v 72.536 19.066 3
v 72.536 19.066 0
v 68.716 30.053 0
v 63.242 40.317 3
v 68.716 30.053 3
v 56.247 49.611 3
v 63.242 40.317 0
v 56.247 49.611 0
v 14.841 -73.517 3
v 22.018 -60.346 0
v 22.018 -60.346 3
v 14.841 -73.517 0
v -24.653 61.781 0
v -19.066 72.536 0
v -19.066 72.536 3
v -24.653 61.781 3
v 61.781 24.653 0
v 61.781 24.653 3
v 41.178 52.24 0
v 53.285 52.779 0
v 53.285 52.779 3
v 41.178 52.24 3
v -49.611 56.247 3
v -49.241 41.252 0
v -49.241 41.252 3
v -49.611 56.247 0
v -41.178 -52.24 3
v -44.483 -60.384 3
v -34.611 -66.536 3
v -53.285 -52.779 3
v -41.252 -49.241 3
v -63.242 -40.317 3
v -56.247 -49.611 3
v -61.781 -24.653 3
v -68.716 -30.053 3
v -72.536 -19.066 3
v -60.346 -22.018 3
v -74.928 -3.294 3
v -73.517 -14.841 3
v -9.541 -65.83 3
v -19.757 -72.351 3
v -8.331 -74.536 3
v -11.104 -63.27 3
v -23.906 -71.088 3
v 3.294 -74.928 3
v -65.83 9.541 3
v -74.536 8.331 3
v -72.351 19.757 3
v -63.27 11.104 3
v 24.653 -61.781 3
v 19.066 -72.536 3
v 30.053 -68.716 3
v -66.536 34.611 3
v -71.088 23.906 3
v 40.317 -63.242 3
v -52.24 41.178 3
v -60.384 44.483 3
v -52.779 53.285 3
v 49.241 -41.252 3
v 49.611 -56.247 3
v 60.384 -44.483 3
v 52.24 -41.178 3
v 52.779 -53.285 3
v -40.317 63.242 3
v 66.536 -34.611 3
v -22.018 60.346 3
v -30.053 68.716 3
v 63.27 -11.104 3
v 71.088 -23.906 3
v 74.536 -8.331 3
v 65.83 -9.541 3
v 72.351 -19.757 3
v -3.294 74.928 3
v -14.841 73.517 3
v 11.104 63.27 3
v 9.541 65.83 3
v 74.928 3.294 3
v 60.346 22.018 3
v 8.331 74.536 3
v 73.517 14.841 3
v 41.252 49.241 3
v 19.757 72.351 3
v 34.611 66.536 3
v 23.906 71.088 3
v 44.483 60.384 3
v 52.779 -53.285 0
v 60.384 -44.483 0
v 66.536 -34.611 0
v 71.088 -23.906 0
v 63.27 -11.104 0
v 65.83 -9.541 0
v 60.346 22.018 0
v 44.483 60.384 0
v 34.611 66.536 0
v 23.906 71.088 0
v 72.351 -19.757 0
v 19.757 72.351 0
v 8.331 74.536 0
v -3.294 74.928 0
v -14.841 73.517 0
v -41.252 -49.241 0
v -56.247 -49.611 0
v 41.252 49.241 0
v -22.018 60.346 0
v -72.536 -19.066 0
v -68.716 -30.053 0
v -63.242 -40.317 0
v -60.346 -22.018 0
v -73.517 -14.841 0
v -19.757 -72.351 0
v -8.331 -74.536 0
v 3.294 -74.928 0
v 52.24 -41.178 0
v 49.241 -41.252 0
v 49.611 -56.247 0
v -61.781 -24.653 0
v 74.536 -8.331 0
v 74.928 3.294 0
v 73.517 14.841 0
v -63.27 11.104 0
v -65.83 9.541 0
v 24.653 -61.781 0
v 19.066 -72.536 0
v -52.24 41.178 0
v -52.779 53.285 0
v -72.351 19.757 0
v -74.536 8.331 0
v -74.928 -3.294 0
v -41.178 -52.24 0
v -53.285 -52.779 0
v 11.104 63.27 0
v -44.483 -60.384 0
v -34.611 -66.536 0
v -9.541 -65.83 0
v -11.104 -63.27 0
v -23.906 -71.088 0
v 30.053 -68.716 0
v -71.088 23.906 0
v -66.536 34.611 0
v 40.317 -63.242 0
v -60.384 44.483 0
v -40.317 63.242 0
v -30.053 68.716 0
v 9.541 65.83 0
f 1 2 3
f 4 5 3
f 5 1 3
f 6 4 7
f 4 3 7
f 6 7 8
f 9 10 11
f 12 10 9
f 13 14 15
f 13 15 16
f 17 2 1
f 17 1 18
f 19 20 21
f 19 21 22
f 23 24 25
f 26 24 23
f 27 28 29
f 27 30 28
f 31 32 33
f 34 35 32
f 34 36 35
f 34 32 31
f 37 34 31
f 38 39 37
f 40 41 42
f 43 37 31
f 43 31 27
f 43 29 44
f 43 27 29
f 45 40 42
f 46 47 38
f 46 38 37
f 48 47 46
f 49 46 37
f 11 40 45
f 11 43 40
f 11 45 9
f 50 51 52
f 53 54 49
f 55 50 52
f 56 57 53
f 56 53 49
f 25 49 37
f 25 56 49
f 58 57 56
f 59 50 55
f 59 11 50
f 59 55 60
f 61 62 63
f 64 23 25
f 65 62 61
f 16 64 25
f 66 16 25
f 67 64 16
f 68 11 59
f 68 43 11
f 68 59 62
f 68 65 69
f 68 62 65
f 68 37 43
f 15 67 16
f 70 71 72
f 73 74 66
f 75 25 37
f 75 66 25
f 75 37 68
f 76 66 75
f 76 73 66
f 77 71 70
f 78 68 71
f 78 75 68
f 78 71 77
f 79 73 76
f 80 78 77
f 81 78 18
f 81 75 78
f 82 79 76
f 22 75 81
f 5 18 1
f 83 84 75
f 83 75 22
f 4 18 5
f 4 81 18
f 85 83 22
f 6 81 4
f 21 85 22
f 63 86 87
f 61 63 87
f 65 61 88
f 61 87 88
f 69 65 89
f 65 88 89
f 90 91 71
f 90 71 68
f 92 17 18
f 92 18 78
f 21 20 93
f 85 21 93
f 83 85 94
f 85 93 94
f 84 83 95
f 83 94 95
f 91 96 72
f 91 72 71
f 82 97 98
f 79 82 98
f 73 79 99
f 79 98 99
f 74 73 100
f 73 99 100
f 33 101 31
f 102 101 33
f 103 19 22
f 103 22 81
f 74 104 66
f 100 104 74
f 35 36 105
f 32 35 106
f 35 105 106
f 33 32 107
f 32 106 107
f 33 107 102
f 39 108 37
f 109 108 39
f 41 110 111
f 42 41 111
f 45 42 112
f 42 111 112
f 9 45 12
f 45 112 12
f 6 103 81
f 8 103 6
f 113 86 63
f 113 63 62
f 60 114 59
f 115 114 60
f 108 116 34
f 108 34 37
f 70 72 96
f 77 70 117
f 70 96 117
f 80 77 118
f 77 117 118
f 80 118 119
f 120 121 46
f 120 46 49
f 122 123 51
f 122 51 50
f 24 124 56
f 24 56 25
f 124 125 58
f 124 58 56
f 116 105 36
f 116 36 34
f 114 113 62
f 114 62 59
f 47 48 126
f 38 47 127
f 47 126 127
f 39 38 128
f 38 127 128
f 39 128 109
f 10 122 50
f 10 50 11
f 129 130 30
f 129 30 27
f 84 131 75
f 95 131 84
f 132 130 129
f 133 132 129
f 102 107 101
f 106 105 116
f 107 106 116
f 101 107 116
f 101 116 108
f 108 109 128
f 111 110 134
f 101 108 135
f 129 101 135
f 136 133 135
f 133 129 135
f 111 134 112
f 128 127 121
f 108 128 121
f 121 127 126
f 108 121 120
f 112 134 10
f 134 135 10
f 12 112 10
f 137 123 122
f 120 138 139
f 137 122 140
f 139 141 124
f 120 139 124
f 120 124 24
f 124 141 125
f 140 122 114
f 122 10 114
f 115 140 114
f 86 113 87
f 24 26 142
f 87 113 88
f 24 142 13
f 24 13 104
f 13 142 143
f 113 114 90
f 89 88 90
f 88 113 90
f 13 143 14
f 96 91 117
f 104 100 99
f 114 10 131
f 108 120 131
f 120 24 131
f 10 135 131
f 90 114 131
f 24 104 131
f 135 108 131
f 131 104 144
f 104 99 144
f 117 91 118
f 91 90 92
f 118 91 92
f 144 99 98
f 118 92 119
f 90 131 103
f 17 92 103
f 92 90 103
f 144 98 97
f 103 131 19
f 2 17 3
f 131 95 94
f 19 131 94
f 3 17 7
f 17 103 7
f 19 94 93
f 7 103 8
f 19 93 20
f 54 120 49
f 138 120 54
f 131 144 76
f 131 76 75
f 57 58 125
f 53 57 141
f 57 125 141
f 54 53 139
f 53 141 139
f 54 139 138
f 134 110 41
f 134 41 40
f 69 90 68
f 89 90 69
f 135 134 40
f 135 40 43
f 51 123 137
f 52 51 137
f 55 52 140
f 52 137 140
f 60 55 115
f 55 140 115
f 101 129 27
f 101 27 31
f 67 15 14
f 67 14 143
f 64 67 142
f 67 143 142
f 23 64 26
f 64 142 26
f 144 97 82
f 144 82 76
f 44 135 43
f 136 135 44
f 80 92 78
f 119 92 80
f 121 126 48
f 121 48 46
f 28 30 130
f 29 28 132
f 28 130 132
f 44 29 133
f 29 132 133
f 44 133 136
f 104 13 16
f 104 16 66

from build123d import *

# Parameters (mm, degrees)
F0_R            = 75
F1_DEPTH        = 3
F3_DEPTH        = 3
F3_COPIES_COUNT = 12


# Not quite as in the source:
# - a pattern or mirror of a feature is missing from the dataset's text; its kind, count and spacing are read off the source's solid


with BuildPart() as f1:
    # F0 (on Top) → F1 (new body)
    with BuildSketch(Plane.XY):
        Circle(F0_R)
    extrude(amount=F1_DEPTH)

    # F2 (on Top) → F3 (cut, through all)
    with BuildSketch(Plane.XY):
        with BuildLine():
            Line((23.905803232, 71.0880620909), (28.1729654475, 73.6940794788))
            Line((28.1729654475, 73.6940794788), (19.7568770352, 72.3509903859))
            ThreePointArc((19.7568770352, 72.3509903859), (21.840470668, 71.7495215385), (23.905803232, 71.0880620909))
        make_face()
        with BuildLine():
            Line((11.1043165854, 63.2700099269), (23.905803232, 71.0880620909))
            ThreePointArc((23.905803232, 71.0880620909), (21.840470668, 71.7495215385), (19.7568770352, 72.3509903859))
            Line((19.7568770352, 72.3509903859), (9.5407061526, 65.8303072562))
            Line((9.5407061526, 65.8303072562), (11.1043165854, 63.2700099269))
        make_face()
    f3 = extrude(amount=F3_DEPTH, mode=Mode.SUBTRACT)

    # F3_copies: F3 ×12 about axis
    f3_copies_axis = Axis((0, 0, 0), (0, 0, 1))
    for i in range(1, F3_COPIES_COUNT):
        add(f3.rotate(f3_copies_axis, i * 360 / F3_COPIES_COUNT), mode=Mode.SUBTRACT)


solid = f1.part
